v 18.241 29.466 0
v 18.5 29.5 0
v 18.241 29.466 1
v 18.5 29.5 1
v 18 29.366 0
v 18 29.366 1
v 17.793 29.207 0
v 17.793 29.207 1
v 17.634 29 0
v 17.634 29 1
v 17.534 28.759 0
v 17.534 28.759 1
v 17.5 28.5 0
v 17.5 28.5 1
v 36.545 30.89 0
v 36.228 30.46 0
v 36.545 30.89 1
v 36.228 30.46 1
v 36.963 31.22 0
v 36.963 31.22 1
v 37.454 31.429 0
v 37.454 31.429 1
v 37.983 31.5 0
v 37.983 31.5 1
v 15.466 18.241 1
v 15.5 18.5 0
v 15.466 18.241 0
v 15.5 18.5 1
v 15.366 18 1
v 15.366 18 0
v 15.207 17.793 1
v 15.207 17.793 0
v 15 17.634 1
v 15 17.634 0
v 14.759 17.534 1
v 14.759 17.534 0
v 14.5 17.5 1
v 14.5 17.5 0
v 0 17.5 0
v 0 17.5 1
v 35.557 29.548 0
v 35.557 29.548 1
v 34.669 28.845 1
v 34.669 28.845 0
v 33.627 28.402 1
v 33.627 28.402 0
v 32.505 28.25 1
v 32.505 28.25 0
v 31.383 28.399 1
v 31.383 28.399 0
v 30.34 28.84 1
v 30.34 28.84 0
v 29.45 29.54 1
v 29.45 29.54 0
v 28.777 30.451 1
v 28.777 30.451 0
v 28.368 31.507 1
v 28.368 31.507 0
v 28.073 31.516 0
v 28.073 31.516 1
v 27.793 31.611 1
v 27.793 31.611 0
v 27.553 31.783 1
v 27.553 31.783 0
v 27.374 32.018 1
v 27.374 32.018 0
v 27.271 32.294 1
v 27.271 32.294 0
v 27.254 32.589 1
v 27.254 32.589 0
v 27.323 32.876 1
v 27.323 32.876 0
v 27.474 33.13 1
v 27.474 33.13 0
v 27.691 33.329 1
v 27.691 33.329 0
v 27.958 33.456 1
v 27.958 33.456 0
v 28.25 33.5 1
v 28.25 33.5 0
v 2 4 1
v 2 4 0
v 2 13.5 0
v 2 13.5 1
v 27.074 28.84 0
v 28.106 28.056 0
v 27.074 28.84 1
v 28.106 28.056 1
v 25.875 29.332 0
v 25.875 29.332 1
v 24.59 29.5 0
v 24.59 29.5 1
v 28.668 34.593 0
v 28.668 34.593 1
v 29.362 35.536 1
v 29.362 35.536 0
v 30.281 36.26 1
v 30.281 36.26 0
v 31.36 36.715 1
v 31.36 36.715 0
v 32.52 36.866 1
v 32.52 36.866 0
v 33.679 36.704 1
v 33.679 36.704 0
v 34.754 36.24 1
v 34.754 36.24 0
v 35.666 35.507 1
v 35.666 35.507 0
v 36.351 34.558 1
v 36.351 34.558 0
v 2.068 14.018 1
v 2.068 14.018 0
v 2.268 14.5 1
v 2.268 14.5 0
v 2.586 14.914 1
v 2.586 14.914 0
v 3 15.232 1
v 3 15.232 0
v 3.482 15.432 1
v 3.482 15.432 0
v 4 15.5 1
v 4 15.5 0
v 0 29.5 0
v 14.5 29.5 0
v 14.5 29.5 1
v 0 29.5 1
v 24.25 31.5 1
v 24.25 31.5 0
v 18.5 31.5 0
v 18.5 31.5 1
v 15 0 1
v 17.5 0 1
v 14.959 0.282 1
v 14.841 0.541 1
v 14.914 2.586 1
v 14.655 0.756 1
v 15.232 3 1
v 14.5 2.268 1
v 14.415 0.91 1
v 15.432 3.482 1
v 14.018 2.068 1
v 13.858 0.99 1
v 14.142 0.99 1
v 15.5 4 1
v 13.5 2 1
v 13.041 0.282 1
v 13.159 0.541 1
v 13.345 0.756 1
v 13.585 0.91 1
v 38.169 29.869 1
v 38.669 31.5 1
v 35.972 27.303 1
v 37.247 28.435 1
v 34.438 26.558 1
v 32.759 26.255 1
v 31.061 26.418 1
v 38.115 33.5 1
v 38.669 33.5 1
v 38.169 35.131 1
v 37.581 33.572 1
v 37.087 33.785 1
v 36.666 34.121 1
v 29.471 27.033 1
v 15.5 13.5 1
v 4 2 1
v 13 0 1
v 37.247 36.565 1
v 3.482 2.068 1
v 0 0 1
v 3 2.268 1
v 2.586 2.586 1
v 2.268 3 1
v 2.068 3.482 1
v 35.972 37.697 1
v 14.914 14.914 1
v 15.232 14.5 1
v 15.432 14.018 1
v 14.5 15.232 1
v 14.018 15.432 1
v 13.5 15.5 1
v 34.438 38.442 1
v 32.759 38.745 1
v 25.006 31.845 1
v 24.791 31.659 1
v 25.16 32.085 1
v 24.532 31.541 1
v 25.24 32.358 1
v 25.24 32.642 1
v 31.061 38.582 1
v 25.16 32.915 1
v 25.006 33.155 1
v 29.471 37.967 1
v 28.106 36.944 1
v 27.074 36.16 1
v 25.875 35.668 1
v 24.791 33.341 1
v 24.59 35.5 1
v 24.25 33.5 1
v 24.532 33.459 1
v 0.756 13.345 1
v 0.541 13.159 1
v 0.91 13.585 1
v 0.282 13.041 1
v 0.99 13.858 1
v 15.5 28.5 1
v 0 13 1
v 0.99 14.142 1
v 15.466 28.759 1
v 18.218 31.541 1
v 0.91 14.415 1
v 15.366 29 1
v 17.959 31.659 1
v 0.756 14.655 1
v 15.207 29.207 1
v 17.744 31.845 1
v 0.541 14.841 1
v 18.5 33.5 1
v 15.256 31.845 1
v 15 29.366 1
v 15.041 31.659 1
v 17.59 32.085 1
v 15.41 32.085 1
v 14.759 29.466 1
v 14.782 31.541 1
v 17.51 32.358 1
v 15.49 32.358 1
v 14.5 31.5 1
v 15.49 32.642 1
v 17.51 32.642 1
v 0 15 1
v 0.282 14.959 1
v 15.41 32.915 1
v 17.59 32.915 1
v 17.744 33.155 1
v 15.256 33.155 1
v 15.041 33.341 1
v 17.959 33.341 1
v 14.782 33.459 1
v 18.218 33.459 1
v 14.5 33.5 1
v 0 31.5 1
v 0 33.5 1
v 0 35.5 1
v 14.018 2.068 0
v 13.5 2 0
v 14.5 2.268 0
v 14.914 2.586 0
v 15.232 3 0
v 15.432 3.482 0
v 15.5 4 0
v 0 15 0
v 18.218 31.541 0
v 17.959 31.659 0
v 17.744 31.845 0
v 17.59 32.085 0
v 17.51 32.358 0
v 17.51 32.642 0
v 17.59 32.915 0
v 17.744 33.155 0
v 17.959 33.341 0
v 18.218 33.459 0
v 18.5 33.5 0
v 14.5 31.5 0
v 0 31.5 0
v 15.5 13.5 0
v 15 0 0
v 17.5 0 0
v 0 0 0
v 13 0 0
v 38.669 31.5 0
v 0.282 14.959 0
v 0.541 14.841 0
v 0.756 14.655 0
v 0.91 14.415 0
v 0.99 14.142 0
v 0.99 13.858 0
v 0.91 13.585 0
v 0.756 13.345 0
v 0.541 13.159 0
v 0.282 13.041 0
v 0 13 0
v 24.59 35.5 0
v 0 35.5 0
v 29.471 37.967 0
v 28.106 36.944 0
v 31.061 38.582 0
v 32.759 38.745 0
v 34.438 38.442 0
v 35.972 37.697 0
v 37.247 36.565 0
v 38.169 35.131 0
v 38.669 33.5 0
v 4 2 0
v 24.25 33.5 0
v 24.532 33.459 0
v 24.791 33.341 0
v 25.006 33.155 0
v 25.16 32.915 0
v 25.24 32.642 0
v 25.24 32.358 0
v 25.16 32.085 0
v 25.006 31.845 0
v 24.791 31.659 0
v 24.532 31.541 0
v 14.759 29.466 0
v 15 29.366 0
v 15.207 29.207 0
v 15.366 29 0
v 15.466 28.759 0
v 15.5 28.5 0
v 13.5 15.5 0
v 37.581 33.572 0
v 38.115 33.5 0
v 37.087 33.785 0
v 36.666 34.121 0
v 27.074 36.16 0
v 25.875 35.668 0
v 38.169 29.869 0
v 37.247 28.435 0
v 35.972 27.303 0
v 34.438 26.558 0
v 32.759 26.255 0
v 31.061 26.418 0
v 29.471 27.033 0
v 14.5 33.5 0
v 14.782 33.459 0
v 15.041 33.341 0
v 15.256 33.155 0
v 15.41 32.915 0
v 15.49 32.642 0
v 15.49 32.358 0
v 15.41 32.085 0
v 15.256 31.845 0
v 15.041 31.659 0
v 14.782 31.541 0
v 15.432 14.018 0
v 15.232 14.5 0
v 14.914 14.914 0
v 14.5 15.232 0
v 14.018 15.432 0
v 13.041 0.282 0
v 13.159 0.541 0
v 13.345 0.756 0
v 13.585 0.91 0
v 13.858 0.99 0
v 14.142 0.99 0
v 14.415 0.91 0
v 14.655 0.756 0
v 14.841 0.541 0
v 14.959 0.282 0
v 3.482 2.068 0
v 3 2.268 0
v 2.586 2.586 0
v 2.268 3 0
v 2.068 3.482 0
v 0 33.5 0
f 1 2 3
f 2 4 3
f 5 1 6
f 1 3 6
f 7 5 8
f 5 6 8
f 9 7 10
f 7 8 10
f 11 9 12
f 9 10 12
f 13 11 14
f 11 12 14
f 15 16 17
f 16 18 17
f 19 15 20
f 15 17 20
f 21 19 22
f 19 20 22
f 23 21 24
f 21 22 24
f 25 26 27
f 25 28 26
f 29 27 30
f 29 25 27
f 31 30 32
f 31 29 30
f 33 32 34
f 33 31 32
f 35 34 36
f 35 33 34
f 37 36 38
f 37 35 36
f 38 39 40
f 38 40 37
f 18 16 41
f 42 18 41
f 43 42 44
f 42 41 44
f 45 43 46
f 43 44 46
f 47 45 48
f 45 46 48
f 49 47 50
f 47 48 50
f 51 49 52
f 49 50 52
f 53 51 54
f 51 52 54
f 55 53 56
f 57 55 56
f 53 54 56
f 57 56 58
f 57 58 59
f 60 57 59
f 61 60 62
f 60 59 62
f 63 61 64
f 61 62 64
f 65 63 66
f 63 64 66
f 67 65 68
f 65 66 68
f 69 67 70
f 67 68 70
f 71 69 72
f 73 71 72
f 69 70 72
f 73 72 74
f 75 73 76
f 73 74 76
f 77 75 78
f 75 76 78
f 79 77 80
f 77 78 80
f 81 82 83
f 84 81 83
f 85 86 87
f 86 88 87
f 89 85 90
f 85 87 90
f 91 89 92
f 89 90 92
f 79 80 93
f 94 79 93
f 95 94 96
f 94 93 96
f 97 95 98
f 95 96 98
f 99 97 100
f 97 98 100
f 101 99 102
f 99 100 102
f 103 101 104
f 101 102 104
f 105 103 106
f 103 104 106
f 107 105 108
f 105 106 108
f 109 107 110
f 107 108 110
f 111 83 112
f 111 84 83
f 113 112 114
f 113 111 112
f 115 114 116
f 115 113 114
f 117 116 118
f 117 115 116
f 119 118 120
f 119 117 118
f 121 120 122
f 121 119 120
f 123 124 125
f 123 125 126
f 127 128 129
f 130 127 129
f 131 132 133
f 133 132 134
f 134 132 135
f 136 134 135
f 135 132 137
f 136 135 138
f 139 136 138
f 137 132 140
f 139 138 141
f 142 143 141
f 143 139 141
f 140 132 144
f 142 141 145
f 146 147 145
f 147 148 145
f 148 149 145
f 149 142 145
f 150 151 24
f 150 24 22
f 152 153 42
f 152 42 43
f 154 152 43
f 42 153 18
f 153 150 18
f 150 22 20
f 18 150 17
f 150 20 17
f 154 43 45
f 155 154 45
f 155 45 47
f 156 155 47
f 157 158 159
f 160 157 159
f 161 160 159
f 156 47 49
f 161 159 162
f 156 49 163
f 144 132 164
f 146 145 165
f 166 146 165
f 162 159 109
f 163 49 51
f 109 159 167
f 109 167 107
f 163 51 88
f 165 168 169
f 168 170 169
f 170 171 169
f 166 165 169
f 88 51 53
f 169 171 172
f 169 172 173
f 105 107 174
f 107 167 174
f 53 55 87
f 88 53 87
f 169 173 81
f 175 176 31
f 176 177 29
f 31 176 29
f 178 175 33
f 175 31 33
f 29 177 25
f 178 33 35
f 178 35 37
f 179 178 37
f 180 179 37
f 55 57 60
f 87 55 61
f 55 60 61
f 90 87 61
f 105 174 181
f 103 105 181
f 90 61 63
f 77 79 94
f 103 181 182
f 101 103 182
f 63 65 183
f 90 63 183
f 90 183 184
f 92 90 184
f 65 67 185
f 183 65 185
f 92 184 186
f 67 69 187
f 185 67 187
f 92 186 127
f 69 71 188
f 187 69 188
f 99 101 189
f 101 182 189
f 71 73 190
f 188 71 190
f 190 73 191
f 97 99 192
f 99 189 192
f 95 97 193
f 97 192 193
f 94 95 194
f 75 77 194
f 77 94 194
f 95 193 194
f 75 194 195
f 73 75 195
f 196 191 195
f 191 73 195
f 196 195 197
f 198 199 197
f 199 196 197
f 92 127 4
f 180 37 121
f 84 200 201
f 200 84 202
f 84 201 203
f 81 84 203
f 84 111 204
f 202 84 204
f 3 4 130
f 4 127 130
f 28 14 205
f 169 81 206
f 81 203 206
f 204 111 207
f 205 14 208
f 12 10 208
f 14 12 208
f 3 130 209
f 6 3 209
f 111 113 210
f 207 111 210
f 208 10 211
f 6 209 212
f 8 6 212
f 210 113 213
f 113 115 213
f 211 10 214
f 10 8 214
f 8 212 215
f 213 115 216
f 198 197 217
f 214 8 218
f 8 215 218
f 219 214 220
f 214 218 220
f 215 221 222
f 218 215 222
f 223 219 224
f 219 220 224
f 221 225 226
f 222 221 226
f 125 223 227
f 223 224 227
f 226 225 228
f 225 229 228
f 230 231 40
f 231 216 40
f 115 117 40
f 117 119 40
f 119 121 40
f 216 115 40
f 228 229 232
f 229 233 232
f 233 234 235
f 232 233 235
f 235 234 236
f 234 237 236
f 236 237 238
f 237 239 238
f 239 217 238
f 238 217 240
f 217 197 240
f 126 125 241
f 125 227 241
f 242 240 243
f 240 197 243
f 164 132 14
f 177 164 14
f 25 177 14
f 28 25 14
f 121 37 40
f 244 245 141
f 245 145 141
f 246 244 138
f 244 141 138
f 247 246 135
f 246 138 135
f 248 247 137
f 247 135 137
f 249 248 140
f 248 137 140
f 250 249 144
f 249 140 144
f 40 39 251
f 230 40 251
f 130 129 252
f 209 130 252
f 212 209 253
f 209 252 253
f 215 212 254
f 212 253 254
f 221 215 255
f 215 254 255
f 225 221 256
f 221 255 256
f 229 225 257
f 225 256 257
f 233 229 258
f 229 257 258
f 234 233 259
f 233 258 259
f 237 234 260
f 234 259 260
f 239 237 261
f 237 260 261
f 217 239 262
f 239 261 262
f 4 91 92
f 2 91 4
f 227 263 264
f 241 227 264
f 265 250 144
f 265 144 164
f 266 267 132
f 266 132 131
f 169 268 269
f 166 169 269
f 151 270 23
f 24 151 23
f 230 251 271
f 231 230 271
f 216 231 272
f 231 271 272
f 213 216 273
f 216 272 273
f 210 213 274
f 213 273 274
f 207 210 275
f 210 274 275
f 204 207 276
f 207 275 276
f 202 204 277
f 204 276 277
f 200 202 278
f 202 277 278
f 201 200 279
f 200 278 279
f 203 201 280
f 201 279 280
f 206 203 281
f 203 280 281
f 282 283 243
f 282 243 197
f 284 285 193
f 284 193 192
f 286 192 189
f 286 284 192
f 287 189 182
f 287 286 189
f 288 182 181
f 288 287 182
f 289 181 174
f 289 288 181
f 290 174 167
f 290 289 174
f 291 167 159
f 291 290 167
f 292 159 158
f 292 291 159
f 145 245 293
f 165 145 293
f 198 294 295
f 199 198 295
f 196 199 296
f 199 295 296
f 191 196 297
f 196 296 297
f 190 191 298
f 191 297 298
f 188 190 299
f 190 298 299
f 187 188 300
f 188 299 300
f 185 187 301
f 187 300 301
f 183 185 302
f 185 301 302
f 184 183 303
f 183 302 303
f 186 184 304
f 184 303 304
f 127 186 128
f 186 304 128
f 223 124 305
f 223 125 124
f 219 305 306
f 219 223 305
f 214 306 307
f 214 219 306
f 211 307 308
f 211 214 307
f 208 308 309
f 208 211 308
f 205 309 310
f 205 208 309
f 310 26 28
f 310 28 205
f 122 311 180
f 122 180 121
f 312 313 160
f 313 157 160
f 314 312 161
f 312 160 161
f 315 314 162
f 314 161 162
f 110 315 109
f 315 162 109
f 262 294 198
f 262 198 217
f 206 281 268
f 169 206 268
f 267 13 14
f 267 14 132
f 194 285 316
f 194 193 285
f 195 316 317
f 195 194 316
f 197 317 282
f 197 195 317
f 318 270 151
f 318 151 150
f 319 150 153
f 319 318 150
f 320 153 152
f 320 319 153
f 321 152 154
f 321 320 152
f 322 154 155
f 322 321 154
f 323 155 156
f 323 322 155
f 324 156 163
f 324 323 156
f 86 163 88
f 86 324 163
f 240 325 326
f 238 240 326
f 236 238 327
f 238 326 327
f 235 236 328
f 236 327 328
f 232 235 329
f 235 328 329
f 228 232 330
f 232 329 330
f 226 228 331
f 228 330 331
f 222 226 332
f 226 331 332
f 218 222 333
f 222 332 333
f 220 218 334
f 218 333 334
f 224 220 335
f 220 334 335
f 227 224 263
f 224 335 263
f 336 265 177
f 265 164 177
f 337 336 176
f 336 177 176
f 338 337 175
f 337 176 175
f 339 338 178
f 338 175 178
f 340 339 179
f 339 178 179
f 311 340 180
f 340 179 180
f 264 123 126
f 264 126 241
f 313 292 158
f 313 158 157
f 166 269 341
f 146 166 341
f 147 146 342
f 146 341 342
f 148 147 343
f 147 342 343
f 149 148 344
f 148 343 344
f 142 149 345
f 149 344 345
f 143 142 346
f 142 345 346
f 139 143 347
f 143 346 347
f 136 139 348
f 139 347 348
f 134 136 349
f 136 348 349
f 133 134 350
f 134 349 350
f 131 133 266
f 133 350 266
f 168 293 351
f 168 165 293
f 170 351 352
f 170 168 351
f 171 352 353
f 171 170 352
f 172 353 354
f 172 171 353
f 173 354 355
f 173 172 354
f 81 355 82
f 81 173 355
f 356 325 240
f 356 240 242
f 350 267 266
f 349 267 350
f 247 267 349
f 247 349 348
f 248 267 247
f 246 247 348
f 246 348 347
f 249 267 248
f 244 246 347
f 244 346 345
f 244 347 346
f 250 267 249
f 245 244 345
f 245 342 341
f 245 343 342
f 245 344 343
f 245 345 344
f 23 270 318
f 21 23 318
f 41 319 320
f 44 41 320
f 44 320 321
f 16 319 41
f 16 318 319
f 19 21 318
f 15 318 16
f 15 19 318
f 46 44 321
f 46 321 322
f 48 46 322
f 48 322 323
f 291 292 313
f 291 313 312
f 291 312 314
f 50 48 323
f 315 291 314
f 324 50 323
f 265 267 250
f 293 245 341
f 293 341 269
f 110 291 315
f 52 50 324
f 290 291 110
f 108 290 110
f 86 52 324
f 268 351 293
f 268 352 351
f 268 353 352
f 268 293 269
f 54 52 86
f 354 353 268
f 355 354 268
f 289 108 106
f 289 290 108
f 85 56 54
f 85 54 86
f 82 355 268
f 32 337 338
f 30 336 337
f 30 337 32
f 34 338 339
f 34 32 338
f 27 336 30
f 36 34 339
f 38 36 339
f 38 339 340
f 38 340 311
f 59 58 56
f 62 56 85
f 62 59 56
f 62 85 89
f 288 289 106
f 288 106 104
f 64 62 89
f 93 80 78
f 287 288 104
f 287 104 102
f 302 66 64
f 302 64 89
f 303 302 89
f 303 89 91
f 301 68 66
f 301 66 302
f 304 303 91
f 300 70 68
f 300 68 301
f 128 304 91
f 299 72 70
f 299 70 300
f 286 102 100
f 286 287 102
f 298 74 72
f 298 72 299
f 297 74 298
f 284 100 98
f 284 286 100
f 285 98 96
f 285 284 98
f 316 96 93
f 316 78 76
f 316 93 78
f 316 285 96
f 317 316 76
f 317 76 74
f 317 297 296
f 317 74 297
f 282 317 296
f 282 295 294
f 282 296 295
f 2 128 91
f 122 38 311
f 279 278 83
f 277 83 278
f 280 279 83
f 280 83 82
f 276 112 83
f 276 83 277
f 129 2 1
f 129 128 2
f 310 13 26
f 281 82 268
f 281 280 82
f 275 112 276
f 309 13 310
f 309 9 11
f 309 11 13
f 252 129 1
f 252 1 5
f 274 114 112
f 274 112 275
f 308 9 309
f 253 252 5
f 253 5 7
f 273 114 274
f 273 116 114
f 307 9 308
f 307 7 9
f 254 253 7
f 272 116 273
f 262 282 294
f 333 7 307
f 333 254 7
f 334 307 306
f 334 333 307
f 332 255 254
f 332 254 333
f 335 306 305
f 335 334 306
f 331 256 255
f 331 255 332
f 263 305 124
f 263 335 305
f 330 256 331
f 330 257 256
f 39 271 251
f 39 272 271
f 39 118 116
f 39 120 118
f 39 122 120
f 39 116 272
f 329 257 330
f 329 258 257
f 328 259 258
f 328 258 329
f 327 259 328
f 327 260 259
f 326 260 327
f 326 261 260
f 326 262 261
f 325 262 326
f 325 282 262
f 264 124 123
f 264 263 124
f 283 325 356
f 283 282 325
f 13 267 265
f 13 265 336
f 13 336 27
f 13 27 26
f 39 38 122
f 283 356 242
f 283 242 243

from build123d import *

# Parameters (mm, degrees)
SKETCH_W    = 13.5
SKETCH_H    = 13.5
PAD_DEPTH   = 1
FILLET_R    = 2
FILLET001_R = 5
FILLET002_R = 1
FILLET003_R = 2


with BuildPart() as fillet003:
    # Sketch → Pad (new body)
    with BuildSketch(Plane.XY):
        with BuildLine():
            Line((0, 35.5), (-27.017072, 35.5))
            ThreePointArc((-27.017072, 35.5), (-33.557279, 38.659924), (-38.669481, 33.5))
            Line((-38.669481, 33.5), (-36.75, 33.5))
            ThreePointArc((-28.25, 33.5), (-32.5, 36.866062), (-36.75, 33.5))
            ThreePointArc((-28.367647, 31.506945), (-27.251738, 32.441074), (-28.25, 33.5))
            ThreePointArc((-36.630678, 31.5), (-32.496428, 28.250002), (-28.367647, 31.506945))
            Line((-38.669481, 31.5), (-36.630678, 31.5))
            ThreePointArc((-38.669481, 31.5), (-33.557279, 26.340076), (-27.017072, 29.5))
            Line((-27.017072, 29.5), (-17.5, 29.5))
            Line((-17.5, 29.5), (-17.5, 0))
            Line((-17.5, 0), (-15, 0))
            ThreePointArc((-13, 0), (-14, 1), (-15, 0))
            Line((0, 0), (-13, 0))
            Line((0, 13), (0, 0))
            ThreePointArc((0, 15), (-1, 14), (0, 13))
            Line((0, 17.5), (0, 15))
            Line((0, 17.5), (-15.5, 17.5))
            Line((-15.5, 17.5), (-15.5, 29.5))
            Line((-15.5, 29.5), (0, 29.5))
            Line((0, 29.5), (0, 31.5))
            Line((-14.5, 31.5), (0, 31.5))
            ThreePointArc((-14.5, 33.5), (-15.5, 32.5), (-14.5, 31.5))
            Line((-14.5, 33.5), (0, 33.5))
            Line((0, 33.5), (0, 35.5))
        make_face()
        with Locations((-8.75, 8.75)):
            Rectangle(SKETCH_W, SKETCH_H, mode=Mode.SUBTRACT)
        with BuildLine():
            ThreePointArc((-24.25, 33.5), (-25.25, 32.5), (-24.25, 31.5))
            Line((-24.25, 31.5), (-18.5, 31.5))
            ThreePointArc((-18.5, 31.5), (-17.5, 32.5), (-18.5, 33.5))
            Line((-24.25, 33.5), (-18.5, 33.5))
        make_face(mode=Mode.SUBTRACT)
    extrude(amount=PAD_DEPTH)

    # Fillet
    fillet_edges = [fillet003.edges().sort_by_distance(p)[0] for p in [
        (-36.75, 33.5, 0.5),
        (-36.630678, 31.5, 0.5),
    ]]
    fillet(fillet_edges, radius=FILLET_R)

    # Fillet001
    fillet001_edges = [fillet003.edges().sort_by_distance(p)[0] for p in [
        (-27.017072, 29.5, 0.5),
        (-27.017072, 35.5, 0.5),
    ]]
    fillet(fillet001_edges, radius=FILLET001_R)

    # Fillet002
    fillet002_edges = [fillet003.edges().sort_by_distance(p)[0] for p in [
        (-15.5, 17.5, 0.5),
        (-15.5, 29.5, 0.5),
        (-17.5, 29.5, 0.5),
    ]]
    fillet(fillet002_edges, radius=FILLET002_R)

    # Fillet003
    fillet003_edges = [fillet003.edges().sort_by_distance(p)[0] for p in [
        (-15.5, 15.5, 0.5),
        (-2, 15.5, 0.5),
        (-2, 2, 0.5),
        (-15.5, 2, 0.5),
    ]]
    fillet(fillet003_edges, radius=FILLET003_R)


with BuildPart() as part_mirroring:
    # Part__Mirroring: instance of Fillet003
    add(fillet003.part.mirror(Plane(origin=(0, 0, 0), x_dir=(1, 0, 0), z_dir=(0, 1, 0))))


with BuildPart() as part_mirroring001:
    # Part__Mirroring001: instance of Part__Mirroring
    add(part_mirroring.part.mirror(Plane(origin=(0, 0, 0), x_dir=(0, -1, 0), z_dir=(1, 0, 0))))


with BuildPart() as part_mirroring002:
    # Part__Mirroring002: instance of Part__Mirroring001
    add(part_mirroring001.part.mirror(Plane(origin=(0, 0, 0), x_dir=(1, 0, 0), z_dir=(0, 1, 0))))


solid = part_mirroring002.part
